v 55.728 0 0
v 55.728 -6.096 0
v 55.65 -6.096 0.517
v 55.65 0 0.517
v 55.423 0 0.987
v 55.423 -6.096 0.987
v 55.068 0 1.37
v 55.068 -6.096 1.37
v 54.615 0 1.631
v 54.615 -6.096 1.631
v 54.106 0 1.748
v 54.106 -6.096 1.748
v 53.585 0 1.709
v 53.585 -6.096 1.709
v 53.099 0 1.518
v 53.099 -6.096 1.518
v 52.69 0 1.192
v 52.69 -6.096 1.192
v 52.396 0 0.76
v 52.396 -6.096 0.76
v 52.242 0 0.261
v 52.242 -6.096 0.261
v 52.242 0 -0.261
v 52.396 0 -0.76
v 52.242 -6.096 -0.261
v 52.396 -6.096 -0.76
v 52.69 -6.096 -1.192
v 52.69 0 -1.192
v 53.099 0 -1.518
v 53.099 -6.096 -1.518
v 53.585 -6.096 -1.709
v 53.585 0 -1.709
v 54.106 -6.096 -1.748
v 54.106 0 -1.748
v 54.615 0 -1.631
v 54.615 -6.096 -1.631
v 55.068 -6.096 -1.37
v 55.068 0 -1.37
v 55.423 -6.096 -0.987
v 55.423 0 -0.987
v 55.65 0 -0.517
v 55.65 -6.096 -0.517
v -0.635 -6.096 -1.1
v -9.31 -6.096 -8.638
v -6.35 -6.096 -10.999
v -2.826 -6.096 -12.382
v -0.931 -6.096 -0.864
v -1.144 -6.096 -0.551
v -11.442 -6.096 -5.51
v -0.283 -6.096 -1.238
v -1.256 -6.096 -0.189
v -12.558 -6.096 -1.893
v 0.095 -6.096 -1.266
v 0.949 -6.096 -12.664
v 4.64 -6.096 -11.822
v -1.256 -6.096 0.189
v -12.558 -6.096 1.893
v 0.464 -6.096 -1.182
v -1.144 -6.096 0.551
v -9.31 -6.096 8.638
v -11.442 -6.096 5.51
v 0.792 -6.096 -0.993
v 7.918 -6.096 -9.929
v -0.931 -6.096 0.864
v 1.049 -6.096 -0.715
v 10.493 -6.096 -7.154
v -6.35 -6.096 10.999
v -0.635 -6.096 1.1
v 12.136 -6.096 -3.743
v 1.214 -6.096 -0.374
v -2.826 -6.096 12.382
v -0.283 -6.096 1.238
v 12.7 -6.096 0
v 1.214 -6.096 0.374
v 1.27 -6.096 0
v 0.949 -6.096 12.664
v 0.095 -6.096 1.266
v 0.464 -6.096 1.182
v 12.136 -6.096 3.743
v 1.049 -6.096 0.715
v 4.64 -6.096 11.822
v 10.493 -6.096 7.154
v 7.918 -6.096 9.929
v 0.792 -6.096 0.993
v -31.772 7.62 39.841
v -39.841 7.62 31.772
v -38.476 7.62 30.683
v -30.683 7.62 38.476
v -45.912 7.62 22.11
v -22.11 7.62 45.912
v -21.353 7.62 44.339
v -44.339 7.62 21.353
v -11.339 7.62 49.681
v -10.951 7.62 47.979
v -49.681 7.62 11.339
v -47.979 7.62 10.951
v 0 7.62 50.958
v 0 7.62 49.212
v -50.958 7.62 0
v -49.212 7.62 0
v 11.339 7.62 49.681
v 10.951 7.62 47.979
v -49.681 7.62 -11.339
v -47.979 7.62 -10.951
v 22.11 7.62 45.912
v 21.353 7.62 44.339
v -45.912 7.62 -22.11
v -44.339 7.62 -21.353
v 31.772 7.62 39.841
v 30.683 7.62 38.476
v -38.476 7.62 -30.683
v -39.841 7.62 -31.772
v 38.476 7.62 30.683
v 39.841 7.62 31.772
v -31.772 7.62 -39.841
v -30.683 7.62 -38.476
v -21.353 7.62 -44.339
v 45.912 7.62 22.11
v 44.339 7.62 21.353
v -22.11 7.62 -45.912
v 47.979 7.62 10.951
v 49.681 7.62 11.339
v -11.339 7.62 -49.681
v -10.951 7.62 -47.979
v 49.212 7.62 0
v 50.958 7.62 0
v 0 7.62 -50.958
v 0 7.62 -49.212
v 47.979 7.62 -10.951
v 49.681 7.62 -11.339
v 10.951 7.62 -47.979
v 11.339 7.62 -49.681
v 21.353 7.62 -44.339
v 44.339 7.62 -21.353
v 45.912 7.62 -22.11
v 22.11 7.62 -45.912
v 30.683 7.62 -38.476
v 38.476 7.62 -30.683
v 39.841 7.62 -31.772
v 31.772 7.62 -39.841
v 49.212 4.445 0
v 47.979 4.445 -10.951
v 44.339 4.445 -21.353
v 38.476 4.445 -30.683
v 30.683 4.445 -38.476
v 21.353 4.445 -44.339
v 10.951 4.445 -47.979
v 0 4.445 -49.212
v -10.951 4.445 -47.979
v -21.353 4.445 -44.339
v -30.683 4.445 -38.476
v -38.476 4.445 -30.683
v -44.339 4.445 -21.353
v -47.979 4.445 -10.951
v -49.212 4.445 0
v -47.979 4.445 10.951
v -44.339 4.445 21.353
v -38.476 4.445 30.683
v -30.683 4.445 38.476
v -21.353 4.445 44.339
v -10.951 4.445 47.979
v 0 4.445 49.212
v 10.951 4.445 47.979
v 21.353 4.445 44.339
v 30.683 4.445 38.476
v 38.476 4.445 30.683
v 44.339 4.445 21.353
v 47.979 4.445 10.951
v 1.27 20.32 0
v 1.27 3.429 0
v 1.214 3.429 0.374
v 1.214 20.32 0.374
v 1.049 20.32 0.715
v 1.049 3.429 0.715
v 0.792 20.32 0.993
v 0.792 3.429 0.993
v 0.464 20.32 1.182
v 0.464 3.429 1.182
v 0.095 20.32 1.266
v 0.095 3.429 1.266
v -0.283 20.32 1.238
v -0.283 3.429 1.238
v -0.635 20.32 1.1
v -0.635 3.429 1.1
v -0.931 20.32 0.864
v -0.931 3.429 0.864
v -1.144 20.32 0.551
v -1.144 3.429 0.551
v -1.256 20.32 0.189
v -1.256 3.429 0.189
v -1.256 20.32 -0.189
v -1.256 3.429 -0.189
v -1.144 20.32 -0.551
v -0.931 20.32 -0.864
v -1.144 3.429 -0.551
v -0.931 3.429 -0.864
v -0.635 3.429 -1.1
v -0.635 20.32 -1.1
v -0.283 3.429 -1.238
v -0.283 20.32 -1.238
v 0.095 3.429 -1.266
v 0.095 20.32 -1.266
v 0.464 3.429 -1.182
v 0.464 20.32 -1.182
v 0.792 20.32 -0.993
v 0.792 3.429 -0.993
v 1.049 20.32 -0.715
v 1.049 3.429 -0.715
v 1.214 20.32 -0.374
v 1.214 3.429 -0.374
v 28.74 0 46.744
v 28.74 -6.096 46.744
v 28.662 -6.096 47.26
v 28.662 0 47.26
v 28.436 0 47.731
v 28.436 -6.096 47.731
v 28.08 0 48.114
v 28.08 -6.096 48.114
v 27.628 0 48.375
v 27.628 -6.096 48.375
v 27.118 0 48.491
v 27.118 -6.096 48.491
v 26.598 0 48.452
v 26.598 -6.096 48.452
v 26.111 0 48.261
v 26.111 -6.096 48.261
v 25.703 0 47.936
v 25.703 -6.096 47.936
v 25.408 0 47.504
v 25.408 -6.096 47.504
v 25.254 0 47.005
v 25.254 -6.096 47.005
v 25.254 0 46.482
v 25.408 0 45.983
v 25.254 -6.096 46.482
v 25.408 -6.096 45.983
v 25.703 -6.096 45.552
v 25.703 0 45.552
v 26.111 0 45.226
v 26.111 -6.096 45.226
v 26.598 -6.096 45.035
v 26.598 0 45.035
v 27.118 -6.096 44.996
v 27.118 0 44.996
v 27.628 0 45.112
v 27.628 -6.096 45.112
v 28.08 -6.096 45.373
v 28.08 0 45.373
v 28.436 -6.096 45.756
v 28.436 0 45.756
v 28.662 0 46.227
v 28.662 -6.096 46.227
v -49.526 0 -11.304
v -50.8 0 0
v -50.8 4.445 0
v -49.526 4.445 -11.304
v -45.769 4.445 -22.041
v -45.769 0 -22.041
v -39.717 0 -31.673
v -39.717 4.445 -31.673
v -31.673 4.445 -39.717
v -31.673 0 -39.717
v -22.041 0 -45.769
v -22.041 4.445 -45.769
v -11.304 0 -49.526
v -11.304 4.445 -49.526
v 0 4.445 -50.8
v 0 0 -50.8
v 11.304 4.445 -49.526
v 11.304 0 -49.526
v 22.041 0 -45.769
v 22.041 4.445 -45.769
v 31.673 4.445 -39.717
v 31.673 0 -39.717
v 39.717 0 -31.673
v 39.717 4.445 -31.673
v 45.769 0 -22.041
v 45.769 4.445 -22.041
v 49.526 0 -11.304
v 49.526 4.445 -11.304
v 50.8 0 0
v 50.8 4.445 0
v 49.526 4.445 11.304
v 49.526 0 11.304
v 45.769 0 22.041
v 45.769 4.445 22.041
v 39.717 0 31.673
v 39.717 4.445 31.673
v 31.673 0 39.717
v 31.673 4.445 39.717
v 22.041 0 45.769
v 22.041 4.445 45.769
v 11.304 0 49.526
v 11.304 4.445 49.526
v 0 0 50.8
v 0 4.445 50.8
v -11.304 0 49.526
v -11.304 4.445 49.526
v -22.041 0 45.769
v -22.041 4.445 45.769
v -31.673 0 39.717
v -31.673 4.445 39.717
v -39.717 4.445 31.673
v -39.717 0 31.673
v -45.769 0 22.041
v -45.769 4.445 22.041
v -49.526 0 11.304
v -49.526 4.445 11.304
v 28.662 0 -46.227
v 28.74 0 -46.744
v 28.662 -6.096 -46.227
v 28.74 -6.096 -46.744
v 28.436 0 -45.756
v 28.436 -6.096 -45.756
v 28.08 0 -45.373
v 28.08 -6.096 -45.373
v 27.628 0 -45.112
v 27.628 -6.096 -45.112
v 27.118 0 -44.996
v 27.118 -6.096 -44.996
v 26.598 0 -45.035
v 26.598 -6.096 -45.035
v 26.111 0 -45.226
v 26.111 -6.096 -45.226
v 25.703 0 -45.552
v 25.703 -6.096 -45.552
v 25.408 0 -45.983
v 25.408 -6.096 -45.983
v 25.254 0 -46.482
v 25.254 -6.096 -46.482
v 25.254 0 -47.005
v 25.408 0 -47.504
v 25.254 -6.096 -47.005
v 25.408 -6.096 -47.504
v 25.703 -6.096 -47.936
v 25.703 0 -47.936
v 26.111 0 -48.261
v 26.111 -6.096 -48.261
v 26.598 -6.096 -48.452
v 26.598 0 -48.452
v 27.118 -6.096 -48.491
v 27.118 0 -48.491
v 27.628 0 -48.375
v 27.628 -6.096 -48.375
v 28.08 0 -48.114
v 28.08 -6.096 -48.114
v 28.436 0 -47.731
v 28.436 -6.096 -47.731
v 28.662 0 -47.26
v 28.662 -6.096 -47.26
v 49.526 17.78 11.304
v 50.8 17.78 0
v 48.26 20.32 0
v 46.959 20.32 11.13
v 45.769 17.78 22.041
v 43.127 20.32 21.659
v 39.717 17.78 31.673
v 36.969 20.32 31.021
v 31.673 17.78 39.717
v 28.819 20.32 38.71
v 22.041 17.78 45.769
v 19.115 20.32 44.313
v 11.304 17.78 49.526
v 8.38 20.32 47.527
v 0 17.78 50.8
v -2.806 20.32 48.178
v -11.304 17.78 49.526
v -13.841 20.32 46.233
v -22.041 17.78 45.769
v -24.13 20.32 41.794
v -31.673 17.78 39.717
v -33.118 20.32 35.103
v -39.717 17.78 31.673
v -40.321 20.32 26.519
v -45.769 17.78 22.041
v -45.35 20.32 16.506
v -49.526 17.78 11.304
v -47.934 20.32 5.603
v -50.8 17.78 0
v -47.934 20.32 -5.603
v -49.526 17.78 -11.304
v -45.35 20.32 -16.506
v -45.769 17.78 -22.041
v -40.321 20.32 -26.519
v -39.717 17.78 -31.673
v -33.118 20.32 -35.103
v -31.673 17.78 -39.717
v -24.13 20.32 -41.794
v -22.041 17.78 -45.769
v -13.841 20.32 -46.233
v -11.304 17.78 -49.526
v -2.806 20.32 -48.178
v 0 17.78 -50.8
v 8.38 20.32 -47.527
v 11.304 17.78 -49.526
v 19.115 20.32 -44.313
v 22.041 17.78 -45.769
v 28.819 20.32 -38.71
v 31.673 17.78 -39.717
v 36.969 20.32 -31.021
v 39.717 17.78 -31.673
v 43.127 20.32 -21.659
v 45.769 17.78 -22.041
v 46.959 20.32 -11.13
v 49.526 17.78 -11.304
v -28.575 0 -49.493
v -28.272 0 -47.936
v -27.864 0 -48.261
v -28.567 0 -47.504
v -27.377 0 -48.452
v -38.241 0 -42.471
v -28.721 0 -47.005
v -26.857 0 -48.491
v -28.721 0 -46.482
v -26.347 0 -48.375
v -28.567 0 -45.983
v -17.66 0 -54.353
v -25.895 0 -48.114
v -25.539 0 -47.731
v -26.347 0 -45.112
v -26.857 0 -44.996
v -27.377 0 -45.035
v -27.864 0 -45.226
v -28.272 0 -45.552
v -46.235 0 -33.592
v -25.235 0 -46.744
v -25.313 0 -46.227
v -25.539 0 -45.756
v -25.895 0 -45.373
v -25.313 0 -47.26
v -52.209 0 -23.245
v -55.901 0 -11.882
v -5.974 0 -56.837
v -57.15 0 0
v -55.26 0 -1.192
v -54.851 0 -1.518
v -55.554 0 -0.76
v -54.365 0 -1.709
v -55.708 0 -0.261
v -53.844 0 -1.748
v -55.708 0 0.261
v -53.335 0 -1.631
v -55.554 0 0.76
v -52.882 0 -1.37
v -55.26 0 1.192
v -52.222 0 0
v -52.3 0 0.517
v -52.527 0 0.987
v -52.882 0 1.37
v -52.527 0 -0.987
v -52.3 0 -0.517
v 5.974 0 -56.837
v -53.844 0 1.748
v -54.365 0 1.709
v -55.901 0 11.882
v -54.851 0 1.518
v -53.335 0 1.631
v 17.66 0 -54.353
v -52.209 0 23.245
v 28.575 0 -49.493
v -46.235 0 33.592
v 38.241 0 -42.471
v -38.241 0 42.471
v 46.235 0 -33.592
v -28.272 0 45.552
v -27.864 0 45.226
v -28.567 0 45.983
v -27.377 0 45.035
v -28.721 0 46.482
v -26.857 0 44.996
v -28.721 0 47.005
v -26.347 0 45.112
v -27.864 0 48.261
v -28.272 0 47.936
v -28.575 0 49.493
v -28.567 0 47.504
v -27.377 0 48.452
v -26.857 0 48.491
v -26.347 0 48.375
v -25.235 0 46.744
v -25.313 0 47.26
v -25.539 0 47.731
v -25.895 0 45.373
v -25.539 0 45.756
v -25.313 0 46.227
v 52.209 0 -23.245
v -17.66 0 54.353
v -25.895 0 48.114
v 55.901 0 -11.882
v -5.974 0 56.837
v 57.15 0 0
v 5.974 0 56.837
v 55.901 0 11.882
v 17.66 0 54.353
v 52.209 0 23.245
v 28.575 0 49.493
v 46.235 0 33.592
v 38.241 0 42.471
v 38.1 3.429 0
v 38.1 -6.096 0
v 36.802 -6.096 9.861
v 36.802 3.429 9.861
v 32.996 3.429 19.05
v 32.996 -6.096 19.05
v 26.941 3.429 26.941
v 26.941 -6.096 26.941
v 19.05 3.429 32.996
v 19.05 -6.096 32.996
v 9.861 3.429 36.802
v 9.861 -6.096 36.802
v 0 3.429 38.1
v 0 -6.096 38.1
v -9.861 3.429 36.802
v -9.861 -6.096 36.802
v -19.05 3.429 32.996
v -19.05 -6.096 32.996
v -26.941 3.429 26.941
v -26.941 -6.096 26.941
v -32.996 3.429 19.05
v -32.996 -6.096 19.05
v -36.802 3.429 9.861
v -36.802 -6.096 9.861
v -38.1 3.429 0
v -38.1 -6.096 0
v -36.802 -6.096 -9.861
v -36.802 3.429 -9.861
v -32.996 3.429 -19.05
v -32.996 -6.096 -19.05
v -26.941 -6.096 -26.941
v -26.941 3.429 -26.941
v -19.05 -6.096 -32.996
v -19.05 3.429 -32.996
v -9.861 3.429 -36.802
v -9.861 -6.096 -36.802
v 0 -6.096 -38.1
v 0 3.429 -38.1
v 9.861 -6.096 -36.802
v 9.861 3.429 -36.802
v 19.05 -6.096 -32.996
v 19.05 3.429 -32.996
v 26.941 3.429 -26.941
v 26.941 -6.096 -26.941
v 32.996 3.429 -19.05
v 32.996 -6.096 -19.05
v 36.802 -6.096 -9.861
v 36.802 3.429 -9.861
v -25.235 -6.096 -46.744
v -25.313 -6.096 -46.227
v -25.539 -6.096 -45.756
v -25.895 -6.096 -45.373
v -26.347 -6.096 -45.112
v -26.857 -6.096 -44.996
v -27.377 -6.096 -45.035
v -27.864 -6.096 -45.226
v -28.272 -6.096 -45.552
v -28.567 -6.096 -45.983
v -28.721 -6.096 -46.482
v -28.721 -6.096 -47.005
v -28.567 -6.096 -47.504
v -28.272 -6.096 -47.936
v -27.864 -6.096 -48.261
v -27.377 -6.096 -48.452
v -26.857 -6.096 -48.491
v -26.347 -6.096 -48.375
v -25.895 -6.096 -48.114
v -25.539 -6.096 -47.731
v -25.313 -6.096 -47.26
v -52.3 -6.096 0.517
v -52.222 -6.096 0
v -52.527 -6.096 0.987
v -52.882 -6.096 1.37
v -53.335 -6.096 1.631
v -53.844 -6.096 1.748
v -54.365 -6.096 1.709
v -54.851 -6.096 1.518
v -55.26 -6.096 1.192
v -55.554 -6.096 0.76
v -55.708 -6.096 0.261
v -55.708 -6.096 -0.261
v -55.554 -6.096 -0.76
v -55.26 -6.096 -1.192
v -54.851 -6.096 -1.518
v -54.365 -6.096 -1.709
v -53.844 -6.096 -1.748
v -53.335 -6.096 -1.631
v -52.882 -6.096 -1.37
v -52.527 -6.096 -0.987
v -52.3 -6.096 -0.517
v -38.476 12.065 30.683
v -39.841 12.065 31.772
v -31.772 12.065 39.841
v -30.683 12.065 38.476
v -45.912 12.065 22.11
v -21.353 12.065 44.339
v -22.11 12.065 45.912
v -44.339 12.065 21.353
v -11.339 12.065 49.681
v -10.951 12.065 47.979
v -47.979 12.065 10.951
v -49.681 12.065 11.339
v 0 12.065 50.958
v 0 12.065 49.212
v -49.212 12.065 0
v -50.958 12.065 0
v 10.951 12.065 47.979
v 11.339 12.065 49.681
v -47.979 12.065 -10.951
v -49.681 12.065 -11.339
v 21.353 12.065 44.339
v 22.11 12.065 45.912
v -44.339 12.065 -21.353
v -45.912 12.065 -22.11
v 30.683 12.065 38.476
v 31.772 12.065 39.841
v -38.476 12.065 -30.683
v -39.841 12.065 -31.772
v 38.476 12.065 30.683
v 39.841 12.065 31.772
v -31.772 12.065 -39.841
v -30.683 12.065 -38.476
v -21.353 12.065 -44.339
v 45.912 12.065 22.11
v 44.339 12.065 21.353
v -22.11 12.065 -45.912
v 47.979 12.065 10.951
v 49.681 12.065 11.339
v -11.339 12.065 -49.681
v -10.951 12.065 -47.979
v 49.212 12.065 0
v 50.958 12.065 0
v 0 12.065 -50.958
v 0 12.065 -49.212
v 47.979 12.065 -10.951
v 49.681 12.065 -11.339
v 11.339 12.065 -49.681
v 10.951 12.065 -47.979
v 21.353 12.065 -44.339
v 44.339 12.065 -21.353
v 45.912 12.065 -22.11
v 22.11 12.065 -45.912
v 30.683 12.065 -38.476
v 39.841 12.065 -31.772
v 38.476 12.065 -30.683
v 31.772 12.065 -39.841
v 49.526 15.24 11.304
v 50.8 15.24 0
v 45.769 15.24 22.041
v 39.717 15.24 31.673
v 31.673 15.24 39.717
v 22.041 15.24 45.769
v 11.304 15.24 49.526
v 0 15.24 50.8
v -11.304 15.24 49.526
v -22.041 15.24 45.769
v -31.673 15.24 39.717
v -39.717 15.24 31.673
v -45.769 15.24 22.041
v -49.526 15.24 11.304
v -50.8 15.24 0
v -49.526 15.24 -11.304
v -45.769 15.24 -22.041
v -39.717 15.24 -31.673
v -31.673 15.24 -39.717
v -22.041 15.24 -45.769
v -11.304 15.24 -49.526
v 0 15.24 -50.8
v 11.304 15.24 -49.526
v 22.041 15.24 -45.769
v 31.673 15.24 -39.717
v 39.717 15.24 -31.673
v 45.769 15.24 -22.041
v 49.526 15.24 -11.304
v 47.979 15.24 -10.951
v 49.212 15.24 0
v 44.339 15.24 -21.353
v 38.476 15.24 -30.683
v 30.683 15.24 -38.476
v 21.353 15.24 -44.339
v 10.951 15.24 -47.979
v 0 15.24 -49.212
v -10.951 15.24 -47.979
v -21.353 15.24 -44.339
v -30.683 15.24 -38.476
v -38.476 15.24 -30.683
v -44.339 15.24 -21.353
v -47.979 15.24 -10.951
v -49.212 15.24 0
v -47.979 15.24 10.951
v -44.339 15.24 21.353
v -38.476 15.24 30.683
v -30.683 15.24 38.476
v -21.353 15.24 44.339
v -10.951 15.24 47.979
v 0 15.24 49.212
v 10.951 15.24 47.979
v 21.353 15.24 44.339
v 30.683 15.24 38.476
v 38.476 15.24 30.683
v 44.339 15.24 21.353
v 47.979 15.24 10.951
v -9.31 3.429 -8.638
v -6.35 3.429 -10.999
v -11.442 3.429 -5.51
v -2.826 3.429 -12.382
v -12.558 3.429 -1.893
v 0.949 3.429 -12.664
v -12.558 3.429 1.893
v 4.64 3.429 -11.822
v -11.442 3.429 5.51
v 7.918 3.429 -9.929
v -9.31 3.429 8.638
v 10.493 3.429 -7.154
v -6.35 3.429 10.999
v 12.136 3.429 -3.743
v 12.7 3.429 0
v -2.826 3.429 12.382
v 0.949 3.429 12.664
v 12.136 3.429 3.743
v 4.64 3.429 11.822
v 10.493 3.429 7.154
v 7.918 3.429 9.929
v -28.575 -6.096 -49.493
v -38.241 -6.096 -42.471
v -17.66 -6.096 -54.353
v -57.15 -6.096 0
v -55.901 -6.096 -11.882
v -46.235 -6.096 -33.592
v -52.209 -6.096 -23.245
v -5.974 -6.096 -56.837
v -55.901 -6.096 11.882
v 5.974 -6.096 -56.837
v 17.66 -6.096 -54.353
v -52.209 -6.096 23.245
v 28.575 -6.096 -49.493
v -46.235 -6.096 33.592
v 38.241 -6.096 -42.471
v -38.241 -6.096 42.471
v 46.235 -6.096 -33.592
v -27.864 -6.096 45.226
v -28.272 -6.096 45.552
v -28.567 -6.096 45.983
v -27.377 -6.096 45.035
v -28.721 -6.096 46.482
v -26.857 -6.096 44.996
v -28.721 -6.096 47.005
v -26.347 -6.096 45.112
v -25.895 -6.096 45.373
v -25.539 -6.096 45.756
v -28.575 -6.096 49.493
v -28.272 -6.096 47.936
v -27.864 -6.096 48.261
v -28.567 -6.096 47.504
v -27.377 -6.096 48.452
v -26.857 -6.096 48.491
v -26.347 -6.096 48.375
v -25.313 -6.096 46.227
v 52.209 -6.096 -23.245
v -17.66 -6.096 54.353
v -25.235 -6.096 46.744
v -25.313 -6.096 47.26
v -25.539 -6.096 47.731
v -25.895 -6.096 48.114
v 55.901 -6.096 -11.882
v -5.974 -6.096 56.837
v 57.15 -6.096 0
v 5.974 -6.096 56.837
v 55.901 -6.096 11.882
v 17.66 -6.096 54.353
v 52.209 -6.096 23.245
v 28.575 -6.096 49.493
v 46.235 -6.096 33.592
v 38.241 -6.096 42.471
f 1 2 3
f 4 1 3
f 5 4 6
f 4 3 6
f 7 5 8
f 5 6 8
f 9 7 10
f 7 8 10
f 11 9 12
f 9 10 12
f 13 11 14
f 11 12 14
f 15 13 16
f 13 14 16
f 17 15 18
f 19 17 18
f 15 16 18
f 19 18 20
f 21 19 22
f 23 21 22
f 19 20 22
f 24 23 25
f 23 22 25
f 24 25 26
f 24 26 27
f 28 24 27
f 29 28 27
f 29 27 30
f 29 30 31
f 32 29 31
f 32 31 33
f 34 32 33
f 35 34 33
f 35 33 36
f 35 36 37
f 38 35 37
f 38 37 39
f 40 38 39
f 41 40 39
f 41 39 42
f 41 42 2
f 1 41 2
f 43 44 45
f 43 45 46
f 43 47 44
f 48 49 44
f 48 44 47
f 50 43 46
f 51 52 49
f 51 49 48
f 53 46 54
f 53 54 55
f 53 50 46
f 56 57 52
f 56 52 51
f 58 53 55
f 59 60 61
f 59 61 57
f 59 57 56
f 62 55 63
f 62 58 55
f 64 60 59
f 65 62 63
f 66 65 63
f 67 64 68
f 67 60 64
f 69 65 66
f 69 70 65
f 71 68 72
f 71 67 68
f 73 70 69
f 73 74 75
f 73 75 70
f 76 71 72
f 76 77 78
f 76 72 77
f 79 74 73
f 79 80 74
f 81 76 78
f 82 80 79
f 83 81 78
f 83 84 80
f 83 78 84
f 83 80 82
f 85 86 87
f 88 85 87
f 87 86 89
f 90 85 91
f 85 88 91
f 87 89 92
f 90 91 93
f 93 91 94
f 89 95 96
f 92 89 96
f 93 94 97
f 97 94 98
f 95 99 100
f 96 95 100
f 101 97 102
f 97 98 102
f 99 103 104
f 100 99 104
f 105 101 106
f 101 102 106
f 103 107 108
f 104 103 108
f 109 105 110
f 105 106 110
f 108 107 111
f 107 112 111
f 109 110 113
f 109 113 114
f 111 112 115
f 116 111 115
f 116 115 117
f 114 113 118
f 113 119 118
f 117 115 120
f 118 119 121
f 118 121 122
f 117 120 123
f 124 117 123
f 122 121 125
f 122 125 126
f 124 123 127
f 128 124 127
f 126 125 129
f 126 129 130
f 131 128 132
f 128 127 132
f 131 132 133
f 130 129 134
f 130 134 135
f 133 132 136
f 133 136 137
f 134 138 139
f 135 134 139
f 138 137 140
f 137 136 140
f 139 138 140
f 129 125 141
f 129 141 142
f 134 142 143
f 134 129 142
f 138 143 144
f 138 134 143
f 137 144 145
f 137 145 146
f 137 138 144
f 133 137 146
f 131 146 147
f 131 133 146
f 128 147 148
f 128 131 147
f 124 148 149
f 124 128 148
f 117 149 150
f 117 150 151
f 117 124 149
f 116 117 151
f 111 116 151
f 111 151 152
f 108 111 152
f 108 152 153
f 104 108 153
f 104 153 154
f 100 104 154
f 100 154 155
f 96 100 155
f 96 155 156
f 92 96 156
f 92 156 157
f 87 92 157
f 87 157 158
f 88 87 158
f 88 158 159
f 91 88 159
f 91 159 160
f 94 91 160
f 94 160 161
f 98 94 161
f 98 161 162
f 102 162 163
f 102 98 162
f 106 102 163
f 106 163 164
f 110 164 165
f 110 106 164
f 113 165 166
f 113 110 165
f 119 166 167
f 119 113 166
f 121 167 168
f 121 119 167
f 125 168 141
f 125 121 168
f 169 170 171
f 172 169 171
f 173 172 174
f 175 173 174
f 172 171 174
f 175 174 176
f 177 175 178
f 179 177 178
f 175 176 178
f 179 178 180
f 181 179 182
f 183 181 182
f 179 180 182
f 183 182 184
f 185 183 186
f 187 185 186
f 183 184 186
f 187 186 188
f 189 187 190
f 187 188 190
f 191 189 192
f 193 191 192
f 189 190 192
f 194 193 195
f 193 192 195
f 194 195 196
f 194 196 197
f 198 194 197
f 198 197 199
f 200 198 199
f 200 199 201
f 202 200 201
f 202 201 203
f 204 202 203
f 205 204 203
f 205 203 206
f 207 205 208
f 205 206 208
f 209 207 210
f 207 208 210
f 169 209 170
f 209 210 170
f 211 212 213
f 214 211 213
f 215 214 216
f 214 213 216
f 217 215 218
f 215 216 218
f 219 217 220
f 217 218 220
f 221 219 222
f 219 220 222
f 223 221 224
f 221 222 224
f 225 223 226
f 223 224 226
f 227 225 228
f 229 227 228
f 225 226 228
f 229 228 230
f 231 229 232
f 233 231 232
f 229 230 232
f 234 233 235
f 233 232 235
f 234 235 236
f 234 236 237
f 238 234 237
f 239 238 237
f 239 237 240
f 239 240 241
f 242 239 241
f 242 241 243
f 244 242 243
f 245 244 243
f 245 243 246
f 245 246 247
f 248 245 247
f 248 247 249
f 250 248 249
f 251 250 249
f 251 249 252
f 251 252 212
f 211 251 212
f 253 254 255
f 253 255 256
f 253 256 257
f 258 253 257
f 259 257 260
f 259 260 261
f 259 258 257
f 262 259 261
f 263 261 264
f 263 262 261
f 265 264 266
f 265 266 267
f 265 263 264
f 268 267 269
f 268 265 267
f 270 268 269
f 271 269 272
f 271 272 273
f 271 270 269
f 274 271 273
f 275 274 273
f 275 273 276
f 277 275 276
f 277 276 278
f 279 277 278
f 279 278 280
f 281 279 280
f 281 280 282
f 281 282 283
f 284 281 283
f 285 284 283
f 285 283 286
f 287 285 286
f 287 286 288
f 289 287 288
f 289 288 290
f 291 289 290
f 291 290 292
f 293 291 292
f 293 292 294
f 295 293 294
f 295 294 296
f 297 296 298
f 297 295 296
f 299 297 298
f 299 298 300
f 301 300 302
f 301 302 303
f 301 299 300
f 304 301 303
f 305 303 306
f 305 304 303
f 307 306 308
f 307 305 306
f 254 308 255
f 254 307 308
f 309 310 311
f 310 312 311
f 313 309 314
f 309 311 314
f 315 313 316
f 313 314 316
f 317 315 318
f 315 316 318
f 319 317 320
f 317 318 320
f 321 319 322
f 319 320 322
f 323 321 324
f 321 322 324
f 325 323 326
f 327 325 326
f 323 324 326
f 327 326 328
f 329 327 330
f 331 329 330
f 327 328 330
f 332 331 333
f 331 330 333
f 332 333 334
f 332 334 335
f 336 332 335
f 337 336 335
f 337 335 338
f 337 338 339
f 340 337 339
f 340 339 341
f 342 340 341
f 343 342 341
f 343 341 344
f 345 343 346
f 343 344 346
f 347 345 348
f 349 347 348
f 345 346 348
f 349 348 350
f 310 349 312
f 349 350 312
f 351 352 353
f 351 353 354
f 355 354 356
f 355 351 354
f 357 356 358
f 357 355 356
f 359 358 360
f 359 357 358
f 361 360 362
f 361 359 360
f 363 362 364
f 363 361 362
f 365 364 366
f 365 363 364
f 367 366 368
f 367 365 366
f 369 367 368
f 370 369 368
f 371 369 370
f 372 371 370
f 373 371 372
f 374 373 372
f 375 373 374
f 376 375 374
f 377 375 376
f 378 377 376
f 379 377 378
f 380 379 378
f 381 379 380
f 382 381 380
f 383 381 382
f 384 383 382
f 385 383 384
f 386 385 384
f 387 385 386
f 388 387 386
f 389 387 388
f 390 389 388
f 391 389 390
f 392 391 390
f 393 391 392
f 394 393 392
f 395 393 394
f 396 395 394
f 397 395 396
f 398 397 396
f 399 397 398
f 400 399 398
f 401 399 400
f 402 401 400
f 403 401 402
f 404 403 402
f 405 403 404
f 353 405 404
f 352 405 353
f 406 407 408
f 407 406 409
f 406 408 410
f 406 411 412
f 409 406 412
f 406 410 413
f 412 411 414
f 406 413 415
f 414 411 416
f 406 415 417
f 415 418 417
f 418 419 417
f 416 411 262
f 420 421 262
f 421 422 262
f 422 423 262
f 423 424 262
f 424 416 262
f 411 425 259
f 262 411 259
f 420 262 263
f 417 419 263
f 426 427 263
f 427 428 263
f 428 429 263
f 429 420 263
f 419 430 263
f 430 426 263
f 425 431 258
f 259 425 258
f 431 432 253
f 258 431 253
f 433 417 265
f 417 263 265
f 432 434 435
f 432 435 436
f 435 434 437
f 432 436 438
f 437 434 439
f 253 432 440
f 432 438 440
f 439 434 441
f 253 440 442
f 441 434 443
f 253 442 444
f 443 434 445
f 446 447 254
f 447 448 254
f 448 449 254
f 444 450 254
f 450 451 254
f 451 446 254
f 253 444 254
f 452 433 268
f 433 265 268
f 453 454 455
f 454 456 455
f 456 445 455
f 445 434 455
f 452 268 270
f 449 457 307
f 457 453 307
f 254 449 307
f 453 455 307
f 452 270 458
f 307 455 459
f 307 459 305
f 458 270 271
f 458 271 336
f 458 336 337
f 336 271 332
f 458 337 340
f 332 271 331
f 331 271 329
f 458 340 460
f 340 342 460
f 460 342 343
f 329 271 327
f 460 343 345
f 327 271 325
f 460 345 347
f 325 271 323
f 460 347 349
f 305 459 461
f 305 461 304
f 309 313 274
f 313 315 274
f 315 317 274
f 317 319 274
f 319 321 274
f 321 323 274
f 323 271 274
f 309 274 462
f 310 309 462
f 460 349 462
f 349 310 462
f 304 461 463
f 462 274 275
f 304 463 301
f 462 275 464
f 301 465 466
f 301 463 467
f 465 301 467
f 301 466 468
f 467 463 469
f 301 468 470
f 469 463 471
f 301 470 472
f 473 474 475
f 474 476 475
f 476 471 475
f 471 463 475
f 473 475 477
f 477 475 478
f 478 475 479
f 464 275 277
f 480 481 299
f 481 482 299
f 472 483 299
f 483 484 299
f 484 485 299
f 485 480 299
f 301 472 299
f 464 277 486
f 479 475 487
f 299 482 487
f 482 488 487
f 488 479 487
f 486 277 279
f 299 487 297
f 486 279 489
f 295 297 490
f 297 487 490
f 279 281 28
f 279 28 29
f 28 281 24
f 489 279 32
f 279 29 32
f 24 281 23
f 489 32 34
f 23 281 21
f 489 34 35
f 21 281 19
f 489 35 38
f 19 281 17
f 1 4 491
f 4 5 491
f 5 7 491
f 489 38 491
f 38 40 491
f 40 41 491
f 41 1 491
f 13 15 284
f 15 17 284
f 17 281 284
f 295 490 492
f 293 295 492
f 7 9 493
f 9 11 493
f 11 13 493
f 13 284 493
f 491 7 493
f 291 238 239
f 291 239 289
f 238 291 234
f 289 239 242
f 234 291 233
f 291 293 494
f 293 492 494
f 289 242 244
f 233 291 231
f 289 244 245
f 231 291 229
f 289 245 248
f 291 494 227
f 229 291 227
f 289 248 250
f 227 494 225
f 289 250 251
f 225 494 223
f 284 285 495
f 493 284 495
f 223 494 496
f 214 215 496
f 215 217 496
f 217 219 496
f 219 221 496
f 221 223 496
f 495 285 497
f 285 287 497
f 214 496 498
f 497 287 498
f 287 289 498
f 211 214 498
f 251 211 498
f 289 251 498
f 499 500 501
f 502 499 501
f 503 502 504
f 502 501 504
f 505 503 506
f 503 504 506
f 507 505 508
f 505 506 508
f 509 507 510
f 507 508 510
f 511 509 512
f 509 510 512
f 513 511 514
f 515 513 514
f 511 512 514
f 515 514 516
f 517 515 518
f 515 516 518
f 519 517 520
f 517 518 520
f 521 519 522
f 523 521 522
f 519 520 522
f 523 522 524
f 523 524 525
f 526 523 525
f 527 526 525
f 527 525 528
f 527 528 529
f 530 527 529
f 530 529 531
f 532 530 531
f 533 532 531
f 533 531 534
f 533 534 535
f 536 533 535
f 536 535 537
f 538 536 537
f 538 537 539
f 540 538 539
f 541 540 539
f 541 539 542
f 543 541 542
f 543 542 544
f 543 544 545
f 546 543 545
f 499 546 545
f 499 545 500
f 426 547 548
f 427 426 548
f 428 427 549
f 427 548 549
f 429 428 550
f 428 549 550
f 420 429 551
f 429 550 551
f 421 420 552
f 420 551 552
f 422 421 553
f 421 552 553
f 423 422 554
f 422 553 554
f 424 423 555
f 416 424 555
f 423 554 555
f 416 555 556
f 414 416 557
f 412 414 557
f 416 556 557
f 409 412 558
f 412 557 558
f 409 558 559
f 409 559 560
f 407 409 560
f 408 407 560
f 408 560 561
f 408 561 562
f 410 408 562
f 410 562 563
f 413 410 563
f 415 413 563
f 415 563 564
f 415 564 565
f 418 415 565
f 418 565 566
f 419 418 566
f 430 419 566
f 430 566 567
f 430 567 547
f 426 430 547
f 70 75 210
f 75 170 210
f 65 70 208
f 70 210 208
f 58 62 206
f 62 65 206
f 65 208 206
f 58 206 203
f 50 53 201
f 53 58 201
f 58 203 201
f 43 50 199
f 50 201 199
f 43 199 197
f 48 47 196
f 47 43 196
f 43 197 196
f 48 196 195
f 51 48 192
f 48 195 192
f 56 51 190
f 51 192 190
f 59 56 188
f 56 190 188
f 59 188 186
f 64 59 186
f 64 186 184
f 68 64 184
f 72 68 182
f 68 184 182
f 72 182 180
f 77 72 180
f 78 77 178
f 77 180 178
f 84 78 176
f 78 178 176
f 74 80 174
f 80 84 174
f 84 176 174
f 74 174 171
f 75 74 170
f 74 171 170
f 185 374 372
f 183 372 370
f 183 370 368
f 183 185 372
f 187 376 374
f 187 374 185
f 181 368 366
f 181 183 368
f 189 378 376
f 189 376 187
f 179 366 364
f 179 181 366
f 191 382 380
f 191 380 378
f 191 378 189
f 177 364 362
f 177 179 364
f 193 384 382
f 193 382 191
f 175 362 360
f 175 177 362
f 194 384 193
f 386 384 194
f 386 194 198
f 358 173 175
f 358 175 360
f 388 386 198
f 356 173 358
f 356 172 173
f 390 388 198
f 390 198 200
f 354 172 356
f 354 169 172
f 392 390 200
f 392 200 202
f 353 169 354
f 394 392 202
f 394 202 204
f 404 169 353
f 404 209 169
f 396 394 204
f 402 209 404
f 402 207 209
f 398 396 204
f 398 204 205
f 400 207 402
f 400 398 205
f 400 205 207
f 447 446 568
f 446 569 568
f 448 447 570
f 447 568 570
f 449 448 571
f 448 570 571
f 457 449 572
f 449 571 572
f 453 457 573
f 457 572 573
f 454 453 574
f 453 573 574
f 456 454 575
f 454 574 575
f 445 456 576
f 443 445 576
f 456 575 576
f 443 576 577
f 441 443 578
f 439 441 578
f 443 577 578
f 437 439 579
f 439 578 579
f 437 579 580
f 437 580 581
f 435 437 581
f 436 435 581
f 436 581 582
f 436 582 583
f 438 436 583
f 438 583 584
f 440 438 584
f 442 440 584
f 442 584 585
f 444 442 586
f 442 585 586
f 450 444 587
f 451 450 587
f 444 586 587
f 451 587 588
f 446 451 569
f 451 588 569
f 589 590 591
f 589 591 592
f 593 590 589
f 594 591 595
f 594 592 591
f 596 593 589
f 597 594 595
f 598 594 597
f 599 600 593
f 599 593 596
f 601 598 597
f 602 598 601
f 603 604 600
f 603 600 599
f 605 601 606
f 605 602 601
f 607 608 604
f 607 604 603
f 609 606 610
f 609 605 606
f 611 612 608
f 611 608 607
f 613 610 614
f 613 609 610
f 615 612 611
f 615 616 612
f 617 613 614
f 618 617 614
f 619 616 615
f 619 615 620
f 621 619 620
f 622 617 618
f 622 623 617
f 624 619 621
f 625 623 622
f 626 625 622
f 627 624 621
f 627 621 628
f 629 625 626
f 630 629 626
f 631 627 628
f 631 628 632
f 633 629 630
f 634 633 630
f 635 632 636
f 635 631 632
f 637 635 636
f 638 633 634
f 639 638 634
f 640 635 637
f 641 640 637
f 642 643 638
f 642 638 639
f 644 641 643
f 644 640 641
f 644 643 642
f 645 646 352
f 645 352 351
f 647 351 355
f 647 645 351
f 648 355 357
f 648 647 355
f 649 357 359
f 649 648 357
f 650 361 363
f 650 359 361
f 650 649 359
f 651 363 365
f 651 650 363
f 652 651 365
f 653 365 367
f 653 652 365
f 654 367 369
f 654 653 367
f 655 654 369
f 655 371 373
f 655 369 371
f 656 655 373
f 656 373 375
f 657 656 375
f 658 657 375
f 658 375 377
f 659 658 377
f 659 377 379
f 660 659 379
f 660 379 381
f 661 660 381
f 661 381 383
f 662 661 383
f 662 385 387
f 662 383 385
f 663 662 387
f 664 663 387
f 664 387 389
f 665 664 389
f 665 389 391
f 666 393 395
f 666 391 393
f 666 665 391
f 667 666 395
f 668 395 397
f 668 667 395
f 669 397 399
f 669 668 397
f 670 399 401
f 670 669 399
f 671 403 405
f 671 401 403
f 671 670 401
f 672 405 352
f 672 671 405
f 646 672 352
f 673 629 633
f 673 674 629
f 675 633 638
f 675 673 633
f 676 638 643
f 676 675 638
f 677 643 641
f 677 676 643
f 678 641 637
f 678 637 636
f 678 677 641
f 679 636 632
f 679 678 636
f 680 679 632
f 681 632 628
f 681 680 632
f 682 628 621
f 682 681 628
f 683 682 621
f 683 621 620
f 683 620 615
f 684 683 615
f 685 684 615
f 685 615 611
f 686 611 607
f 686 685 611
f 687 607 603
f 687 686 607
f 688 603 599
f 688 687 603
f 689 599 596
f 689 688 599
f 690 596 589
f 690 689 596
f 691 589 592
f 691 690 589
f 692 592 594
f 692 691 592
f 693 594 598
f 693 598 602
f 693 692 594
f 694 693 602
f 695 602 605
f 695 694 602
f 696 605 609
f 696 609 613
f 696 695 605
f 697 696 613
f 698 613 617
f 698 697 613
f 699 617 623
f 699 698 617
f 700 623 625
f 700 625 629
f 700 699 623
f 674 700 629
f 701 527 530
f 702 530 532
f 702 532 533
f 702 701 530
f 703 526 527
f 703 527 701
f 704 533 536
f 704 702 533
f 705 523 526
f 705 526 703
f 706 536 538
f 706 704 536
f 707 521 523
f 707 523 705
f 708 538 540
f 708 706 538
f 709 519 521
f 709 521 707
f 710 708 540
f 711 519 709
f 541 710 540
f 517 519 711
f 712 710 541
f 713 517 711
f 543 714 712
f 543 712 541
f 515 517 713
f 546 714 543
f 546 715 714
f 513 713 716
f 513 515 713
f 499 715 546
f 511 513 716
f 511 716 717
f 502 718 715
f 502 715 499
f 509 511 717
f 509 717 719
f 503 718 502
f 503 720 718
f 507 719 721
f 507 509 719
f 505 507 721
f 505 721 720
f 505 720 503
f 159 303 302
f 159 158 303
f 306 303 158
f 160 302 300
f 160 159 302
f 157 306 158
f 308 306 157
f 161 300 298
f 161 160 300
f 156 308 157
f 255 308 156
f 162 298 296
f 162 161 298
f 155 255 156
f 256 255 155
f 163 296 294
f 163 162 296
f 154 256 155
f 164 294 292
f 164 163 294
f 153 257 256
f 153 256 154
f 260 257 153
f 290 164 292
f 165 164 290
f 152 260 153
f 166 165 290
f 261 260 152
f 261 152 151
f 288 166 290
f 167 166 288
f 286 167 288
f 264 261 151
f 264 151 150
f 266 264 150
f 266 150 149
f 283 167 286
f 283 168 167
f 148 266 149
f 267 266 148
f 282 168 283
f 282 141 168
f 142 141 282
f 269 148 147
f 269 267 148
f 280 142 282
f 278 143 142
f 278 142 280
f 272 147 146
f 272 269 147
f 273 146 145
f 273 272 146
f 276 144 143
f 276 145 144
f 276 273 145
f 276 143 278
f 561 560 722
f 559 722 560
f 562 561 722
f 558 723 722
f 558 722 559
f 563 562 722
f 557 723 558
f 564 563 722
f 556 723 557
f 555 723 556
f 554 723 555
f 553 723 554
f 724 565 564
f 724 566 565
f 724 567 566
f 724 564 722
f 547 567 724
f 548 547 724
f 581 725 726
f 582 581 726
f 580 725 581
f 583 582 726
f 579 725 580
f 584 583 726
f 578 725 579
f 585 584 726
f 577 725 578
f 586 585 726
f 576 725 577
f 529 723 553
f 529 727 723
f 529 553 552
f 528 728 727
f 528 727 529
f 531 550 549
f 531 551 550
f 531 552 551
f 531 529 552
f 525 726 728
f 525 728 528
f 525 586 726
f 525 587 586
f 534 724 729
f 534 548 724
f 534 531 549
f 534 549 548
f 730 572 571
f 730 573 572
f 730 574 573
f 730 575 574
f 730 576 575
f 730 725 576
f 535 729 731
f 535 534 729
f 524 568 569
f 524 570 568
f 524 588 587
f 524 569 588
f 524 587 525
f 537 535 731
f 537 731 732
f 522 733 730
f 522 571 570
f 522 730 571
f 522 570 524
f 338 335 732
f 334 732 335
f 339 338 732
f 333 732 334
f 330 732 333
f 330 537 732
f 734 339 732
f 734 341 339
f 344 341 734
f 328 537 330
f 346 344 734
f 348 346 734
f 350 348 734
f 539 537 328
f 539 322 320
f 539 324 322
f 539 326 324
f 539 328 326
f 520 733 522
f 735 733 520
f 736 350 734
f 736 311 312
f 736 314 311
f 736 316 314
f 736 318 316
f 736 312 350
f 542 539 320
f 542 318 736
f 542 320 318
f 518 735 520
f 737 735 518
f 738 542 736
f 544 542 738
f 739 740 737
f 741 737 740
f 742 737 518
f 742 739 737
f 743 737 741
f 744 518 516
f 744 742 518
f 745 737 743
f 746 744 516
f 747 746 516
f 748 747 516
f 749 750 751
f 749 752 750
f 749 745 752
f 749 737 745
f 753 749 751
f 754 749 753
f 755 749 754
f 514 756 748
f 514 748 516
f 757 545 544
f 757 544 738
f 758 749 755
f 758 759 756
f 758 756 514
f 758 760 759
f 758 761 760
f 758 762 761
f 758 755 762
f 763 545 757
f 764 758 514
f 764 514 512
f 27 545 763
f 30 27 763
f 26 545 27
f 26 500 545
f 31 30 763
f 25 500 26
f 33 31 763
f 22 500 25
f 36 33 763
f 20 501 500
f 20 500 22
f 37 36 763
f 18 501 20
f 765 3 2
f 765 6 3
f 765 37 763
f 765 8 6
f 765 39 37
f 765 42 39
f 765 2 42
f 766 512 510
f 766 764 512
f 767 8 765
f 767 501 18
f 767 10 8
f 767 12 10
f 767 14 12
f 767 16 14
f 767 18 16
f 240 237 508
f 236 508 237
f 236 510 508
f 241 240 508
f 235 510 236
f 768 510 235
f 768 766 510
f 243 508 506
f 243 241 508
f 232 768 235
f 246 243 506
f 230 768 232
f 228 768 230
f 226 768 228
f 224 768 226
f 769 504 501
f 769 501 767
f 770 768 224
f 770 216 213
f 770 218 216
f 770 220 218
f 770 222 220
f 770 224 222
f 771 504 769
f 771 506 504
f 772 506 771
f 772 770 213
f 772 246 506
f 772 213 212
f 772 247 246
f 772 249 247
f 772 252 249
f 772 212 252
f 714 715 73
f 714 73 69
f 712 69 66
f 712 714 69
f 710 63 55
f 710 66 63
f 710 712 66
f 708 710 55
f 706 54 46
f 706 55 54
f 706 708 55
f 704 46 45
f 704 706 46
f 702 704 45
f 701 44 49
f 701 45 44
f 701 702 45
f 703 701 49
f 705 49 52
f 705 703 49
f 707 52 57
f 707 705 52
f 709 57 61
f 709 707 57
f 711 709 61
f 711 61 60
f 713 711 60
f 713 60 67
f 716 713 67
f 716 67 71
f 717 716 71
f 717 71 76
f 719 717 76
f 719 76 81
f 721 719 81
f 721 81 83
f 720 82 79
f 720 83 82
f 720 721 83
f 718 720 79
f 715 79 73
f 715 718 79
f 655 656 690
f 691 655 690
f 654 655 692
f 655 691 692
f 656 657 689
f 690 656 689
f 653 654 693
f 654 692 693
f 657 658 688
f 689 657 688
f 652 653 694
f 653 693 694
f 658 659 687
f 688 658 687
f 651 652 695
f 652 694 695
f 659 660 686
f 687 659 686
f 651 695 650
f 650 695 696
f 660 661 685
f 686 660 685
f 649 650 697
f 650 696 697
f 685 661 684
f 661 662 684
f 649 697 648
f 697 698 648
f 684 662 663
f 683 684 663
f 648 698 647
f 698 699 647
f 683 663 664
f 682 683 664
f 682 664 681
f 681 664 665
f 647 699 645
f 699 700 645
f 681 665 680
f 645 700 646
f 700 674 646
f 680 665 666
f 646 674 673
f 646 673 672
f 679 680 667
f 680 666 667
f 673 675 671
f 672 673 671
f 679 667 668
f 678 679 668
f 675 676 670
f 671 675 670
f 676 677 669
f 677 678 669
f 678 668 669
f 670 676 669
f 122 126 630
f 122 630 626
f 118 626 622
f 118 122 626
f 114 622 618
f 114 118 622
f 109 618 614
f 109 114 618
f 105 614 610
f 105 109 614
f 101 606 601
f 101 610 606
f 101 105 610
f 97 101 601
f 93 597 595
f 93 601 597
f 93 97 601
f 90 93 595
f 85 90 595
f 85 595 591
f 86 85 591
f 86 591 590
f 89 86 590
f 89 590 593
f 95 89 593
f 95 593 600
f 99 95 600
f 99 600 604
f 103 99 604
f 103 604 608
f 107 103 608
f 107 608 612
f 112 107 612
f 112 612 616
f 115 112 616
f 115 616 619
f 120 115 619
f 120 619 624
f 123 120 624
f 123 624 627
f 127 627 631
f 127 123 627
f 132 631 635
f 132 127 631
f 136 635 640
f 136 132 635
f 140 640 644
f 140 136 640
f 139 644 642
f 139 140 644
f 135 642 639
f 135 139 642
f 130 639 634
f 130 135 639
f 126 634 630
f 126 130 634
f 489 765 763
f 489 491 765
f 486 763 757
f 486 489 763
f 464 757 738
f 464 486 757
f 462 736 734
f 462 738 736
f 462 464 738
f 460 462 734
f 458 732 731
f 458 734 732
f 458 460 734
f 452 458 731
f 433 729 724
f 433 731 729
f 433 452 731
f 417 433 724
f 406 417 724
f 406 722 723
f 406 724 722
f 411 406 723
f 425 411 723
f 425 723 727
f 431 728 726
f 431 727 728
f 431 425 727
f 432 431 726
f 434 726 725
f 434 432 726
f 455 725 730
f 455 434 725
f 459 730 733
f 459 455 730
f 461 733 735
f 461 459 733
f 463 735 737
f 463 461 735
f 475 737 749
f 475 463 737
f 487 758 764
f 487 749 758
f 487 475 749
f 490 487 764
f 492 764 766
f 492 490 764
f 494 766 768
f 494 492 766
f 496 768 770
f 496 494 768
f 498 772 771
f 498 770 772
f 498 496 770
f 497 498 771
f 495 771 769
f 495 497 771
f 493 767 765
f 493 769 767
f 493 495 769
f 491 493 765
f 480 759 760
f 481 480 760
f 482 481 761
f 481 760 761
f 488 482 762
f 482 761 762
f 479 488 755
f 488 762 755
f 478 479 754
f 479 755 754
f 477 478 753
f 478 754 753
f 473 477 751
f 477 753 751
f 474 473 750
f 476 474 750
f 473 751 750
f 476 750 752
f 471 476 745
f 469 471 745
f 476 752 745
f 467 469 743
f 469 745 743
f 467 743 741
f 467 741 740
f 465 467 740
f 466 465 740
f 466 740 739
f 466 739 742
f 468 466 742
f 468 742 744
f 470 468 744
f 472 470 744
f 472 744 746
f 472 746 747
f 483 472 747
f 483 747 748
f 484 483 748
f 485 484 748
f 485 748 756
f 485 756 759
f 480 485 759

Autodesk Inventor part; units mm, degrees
ref_plane "YZ Plane" through (0, 0, 0) normal (1, 0, 0) x (0, 1, 0)
ref_plane "XZ Plane" through (0, 0, 0) normal (0, 1, 0) x (-1, 0, 0)
ref_plane "XY Plane" through (0, 0, 0) normal (0, 0, 1) x (1, 0, 0)
sketch "Sketch1" plane through (0, 0, 0) normal (0, 1, 0) x (-1, 0, 0)
  circle A0 centre (0, 0) radius 50.8
  dimension "d0" = 101.6
extrude "Extrusion1" add sketch "Sketch1" along normal blind 7.62
sketch "Sketch2" plane through (0, 7.62, 0) normal (0, 1, 0) x (1, 0, 0)
  circle A0 centre (0, 0) radius 49.2125
  circle A1 centre (0, 0) radius 50.8
  dimension "d3" = 98.425
extrude "Extrusion2" cut sketch "Sketch2" against normal blind 3.175
sketch "Sketch3" plane through (0, 7.62, 0) normal (0, 1, 0) x (1, 0, 0)
  circle A0 centre (0, 0) radius 50.9584
extrude "Extrusion3" add sketch "Sketch3" along normal blind 7.62
sketch "Sketch4" plane through (0, 15.24, 0) normal (0, 1, 0) x (1, 0, 0)
  point P0 (0, 0)
sketch "Sketch5" plane through (0, 15.24, 0) normal (0, 1, 0) x (1, 0, 0)
  circle A0 centre (0, 0) radius 49.2125
  circle A1 centre (0, 0) radius 50.9584
  dimension "d8" = 98.425
extrude "Extrusion4" cut sketch "Sketch5" against normal blind 3.175
sketch "Sketch6" plane through (0, 15.24, 0) normal (0, 1, 0) x (1, 0, 0)
  circle A0 centre (0, 0) radius 50.8
  dimension "d11" = 101.6
extrude "Extrusion5" add sketch "Sketch6" along normal blind 5.08
sketch "Sketch7" plane through (0, 0, 0) normal (0, -1, 0) x (1, 0, 0)
  circle A0 centre (0, 0) radius 57.15
  dimension "d14" = 114.3
extrude "Extrusion6" add sketch "Sketch7" along normal blind 6.096
chamfer "Chamfer1" distance 2.54 angle 45 1 edges at (-50.8, 20.32, 0)
sketch "Sketch8" plane through (0, -6.096, 0) normal (0, -1, 0) x (1, 0, 0)
  circle A0 centre (0, 0) radius 50.8
  circle A1 centre (53.975, 0) radius 1.7526
  circle A2 centre (26.9875, 46.7437) radius 1.7526
  circle A3 centre (-26.9875, 46.7437) radius 1.7526
  circle A4 centre (-53.975, 0) radius 1.7526
  circle A5 centre (-26.9875, -46.7437) radius 1.7526
  circle A6 centre (26.9875, -46.7437) radius 1.7526
  dimension "d20" = 3.5052
  dimension "d21" = 53.975
  dimension "d24" = 360
extrude "Extrusion7" cut sketch "Sketch8" against normal blind 6.096 contours A1 | A2 | A3 | A4 | A5 | A6
sketch "Sketch9" plane through (0, -6.096, 0) normal (0, -1, 0) x (1, 0, 0)
  circle A0 centre (0, 0) radius 12.7
  circle A1 centre (0, 0) radius 1.27
  dimension "d28" = 25.4
  dimension "d29" = 2.54
extrude "Extrusion8" cut sketch "Sketch9" against normal blind 127 contours A1
sketch "Sketch10" plane through (0, -6.096, 0) normal (0, -1, 0) x (1, 0, 0)
  circle A0 centre (0, 0) radius 1.27 projected
  circle A1 centre (0, 0) radius 38.1
  dimension "d33" = 76.2
extrude "Extrusion9" cut sketch "Sketch10" against normal blind 9.525
sketch "Sketch11" plane through (0, 3.429, 0) normal (0, -1, 0) x (1, 0, 0)
  circle A0 centre (0, 0) radius 12.7
  circle A1 centre (0, 0) radius 1.27
  dimension "d36" = 25.4
extrude "Extrusion10" add sketch "Sketch11" along normal blind 9.525
properties part number "O ring Plug 1"
